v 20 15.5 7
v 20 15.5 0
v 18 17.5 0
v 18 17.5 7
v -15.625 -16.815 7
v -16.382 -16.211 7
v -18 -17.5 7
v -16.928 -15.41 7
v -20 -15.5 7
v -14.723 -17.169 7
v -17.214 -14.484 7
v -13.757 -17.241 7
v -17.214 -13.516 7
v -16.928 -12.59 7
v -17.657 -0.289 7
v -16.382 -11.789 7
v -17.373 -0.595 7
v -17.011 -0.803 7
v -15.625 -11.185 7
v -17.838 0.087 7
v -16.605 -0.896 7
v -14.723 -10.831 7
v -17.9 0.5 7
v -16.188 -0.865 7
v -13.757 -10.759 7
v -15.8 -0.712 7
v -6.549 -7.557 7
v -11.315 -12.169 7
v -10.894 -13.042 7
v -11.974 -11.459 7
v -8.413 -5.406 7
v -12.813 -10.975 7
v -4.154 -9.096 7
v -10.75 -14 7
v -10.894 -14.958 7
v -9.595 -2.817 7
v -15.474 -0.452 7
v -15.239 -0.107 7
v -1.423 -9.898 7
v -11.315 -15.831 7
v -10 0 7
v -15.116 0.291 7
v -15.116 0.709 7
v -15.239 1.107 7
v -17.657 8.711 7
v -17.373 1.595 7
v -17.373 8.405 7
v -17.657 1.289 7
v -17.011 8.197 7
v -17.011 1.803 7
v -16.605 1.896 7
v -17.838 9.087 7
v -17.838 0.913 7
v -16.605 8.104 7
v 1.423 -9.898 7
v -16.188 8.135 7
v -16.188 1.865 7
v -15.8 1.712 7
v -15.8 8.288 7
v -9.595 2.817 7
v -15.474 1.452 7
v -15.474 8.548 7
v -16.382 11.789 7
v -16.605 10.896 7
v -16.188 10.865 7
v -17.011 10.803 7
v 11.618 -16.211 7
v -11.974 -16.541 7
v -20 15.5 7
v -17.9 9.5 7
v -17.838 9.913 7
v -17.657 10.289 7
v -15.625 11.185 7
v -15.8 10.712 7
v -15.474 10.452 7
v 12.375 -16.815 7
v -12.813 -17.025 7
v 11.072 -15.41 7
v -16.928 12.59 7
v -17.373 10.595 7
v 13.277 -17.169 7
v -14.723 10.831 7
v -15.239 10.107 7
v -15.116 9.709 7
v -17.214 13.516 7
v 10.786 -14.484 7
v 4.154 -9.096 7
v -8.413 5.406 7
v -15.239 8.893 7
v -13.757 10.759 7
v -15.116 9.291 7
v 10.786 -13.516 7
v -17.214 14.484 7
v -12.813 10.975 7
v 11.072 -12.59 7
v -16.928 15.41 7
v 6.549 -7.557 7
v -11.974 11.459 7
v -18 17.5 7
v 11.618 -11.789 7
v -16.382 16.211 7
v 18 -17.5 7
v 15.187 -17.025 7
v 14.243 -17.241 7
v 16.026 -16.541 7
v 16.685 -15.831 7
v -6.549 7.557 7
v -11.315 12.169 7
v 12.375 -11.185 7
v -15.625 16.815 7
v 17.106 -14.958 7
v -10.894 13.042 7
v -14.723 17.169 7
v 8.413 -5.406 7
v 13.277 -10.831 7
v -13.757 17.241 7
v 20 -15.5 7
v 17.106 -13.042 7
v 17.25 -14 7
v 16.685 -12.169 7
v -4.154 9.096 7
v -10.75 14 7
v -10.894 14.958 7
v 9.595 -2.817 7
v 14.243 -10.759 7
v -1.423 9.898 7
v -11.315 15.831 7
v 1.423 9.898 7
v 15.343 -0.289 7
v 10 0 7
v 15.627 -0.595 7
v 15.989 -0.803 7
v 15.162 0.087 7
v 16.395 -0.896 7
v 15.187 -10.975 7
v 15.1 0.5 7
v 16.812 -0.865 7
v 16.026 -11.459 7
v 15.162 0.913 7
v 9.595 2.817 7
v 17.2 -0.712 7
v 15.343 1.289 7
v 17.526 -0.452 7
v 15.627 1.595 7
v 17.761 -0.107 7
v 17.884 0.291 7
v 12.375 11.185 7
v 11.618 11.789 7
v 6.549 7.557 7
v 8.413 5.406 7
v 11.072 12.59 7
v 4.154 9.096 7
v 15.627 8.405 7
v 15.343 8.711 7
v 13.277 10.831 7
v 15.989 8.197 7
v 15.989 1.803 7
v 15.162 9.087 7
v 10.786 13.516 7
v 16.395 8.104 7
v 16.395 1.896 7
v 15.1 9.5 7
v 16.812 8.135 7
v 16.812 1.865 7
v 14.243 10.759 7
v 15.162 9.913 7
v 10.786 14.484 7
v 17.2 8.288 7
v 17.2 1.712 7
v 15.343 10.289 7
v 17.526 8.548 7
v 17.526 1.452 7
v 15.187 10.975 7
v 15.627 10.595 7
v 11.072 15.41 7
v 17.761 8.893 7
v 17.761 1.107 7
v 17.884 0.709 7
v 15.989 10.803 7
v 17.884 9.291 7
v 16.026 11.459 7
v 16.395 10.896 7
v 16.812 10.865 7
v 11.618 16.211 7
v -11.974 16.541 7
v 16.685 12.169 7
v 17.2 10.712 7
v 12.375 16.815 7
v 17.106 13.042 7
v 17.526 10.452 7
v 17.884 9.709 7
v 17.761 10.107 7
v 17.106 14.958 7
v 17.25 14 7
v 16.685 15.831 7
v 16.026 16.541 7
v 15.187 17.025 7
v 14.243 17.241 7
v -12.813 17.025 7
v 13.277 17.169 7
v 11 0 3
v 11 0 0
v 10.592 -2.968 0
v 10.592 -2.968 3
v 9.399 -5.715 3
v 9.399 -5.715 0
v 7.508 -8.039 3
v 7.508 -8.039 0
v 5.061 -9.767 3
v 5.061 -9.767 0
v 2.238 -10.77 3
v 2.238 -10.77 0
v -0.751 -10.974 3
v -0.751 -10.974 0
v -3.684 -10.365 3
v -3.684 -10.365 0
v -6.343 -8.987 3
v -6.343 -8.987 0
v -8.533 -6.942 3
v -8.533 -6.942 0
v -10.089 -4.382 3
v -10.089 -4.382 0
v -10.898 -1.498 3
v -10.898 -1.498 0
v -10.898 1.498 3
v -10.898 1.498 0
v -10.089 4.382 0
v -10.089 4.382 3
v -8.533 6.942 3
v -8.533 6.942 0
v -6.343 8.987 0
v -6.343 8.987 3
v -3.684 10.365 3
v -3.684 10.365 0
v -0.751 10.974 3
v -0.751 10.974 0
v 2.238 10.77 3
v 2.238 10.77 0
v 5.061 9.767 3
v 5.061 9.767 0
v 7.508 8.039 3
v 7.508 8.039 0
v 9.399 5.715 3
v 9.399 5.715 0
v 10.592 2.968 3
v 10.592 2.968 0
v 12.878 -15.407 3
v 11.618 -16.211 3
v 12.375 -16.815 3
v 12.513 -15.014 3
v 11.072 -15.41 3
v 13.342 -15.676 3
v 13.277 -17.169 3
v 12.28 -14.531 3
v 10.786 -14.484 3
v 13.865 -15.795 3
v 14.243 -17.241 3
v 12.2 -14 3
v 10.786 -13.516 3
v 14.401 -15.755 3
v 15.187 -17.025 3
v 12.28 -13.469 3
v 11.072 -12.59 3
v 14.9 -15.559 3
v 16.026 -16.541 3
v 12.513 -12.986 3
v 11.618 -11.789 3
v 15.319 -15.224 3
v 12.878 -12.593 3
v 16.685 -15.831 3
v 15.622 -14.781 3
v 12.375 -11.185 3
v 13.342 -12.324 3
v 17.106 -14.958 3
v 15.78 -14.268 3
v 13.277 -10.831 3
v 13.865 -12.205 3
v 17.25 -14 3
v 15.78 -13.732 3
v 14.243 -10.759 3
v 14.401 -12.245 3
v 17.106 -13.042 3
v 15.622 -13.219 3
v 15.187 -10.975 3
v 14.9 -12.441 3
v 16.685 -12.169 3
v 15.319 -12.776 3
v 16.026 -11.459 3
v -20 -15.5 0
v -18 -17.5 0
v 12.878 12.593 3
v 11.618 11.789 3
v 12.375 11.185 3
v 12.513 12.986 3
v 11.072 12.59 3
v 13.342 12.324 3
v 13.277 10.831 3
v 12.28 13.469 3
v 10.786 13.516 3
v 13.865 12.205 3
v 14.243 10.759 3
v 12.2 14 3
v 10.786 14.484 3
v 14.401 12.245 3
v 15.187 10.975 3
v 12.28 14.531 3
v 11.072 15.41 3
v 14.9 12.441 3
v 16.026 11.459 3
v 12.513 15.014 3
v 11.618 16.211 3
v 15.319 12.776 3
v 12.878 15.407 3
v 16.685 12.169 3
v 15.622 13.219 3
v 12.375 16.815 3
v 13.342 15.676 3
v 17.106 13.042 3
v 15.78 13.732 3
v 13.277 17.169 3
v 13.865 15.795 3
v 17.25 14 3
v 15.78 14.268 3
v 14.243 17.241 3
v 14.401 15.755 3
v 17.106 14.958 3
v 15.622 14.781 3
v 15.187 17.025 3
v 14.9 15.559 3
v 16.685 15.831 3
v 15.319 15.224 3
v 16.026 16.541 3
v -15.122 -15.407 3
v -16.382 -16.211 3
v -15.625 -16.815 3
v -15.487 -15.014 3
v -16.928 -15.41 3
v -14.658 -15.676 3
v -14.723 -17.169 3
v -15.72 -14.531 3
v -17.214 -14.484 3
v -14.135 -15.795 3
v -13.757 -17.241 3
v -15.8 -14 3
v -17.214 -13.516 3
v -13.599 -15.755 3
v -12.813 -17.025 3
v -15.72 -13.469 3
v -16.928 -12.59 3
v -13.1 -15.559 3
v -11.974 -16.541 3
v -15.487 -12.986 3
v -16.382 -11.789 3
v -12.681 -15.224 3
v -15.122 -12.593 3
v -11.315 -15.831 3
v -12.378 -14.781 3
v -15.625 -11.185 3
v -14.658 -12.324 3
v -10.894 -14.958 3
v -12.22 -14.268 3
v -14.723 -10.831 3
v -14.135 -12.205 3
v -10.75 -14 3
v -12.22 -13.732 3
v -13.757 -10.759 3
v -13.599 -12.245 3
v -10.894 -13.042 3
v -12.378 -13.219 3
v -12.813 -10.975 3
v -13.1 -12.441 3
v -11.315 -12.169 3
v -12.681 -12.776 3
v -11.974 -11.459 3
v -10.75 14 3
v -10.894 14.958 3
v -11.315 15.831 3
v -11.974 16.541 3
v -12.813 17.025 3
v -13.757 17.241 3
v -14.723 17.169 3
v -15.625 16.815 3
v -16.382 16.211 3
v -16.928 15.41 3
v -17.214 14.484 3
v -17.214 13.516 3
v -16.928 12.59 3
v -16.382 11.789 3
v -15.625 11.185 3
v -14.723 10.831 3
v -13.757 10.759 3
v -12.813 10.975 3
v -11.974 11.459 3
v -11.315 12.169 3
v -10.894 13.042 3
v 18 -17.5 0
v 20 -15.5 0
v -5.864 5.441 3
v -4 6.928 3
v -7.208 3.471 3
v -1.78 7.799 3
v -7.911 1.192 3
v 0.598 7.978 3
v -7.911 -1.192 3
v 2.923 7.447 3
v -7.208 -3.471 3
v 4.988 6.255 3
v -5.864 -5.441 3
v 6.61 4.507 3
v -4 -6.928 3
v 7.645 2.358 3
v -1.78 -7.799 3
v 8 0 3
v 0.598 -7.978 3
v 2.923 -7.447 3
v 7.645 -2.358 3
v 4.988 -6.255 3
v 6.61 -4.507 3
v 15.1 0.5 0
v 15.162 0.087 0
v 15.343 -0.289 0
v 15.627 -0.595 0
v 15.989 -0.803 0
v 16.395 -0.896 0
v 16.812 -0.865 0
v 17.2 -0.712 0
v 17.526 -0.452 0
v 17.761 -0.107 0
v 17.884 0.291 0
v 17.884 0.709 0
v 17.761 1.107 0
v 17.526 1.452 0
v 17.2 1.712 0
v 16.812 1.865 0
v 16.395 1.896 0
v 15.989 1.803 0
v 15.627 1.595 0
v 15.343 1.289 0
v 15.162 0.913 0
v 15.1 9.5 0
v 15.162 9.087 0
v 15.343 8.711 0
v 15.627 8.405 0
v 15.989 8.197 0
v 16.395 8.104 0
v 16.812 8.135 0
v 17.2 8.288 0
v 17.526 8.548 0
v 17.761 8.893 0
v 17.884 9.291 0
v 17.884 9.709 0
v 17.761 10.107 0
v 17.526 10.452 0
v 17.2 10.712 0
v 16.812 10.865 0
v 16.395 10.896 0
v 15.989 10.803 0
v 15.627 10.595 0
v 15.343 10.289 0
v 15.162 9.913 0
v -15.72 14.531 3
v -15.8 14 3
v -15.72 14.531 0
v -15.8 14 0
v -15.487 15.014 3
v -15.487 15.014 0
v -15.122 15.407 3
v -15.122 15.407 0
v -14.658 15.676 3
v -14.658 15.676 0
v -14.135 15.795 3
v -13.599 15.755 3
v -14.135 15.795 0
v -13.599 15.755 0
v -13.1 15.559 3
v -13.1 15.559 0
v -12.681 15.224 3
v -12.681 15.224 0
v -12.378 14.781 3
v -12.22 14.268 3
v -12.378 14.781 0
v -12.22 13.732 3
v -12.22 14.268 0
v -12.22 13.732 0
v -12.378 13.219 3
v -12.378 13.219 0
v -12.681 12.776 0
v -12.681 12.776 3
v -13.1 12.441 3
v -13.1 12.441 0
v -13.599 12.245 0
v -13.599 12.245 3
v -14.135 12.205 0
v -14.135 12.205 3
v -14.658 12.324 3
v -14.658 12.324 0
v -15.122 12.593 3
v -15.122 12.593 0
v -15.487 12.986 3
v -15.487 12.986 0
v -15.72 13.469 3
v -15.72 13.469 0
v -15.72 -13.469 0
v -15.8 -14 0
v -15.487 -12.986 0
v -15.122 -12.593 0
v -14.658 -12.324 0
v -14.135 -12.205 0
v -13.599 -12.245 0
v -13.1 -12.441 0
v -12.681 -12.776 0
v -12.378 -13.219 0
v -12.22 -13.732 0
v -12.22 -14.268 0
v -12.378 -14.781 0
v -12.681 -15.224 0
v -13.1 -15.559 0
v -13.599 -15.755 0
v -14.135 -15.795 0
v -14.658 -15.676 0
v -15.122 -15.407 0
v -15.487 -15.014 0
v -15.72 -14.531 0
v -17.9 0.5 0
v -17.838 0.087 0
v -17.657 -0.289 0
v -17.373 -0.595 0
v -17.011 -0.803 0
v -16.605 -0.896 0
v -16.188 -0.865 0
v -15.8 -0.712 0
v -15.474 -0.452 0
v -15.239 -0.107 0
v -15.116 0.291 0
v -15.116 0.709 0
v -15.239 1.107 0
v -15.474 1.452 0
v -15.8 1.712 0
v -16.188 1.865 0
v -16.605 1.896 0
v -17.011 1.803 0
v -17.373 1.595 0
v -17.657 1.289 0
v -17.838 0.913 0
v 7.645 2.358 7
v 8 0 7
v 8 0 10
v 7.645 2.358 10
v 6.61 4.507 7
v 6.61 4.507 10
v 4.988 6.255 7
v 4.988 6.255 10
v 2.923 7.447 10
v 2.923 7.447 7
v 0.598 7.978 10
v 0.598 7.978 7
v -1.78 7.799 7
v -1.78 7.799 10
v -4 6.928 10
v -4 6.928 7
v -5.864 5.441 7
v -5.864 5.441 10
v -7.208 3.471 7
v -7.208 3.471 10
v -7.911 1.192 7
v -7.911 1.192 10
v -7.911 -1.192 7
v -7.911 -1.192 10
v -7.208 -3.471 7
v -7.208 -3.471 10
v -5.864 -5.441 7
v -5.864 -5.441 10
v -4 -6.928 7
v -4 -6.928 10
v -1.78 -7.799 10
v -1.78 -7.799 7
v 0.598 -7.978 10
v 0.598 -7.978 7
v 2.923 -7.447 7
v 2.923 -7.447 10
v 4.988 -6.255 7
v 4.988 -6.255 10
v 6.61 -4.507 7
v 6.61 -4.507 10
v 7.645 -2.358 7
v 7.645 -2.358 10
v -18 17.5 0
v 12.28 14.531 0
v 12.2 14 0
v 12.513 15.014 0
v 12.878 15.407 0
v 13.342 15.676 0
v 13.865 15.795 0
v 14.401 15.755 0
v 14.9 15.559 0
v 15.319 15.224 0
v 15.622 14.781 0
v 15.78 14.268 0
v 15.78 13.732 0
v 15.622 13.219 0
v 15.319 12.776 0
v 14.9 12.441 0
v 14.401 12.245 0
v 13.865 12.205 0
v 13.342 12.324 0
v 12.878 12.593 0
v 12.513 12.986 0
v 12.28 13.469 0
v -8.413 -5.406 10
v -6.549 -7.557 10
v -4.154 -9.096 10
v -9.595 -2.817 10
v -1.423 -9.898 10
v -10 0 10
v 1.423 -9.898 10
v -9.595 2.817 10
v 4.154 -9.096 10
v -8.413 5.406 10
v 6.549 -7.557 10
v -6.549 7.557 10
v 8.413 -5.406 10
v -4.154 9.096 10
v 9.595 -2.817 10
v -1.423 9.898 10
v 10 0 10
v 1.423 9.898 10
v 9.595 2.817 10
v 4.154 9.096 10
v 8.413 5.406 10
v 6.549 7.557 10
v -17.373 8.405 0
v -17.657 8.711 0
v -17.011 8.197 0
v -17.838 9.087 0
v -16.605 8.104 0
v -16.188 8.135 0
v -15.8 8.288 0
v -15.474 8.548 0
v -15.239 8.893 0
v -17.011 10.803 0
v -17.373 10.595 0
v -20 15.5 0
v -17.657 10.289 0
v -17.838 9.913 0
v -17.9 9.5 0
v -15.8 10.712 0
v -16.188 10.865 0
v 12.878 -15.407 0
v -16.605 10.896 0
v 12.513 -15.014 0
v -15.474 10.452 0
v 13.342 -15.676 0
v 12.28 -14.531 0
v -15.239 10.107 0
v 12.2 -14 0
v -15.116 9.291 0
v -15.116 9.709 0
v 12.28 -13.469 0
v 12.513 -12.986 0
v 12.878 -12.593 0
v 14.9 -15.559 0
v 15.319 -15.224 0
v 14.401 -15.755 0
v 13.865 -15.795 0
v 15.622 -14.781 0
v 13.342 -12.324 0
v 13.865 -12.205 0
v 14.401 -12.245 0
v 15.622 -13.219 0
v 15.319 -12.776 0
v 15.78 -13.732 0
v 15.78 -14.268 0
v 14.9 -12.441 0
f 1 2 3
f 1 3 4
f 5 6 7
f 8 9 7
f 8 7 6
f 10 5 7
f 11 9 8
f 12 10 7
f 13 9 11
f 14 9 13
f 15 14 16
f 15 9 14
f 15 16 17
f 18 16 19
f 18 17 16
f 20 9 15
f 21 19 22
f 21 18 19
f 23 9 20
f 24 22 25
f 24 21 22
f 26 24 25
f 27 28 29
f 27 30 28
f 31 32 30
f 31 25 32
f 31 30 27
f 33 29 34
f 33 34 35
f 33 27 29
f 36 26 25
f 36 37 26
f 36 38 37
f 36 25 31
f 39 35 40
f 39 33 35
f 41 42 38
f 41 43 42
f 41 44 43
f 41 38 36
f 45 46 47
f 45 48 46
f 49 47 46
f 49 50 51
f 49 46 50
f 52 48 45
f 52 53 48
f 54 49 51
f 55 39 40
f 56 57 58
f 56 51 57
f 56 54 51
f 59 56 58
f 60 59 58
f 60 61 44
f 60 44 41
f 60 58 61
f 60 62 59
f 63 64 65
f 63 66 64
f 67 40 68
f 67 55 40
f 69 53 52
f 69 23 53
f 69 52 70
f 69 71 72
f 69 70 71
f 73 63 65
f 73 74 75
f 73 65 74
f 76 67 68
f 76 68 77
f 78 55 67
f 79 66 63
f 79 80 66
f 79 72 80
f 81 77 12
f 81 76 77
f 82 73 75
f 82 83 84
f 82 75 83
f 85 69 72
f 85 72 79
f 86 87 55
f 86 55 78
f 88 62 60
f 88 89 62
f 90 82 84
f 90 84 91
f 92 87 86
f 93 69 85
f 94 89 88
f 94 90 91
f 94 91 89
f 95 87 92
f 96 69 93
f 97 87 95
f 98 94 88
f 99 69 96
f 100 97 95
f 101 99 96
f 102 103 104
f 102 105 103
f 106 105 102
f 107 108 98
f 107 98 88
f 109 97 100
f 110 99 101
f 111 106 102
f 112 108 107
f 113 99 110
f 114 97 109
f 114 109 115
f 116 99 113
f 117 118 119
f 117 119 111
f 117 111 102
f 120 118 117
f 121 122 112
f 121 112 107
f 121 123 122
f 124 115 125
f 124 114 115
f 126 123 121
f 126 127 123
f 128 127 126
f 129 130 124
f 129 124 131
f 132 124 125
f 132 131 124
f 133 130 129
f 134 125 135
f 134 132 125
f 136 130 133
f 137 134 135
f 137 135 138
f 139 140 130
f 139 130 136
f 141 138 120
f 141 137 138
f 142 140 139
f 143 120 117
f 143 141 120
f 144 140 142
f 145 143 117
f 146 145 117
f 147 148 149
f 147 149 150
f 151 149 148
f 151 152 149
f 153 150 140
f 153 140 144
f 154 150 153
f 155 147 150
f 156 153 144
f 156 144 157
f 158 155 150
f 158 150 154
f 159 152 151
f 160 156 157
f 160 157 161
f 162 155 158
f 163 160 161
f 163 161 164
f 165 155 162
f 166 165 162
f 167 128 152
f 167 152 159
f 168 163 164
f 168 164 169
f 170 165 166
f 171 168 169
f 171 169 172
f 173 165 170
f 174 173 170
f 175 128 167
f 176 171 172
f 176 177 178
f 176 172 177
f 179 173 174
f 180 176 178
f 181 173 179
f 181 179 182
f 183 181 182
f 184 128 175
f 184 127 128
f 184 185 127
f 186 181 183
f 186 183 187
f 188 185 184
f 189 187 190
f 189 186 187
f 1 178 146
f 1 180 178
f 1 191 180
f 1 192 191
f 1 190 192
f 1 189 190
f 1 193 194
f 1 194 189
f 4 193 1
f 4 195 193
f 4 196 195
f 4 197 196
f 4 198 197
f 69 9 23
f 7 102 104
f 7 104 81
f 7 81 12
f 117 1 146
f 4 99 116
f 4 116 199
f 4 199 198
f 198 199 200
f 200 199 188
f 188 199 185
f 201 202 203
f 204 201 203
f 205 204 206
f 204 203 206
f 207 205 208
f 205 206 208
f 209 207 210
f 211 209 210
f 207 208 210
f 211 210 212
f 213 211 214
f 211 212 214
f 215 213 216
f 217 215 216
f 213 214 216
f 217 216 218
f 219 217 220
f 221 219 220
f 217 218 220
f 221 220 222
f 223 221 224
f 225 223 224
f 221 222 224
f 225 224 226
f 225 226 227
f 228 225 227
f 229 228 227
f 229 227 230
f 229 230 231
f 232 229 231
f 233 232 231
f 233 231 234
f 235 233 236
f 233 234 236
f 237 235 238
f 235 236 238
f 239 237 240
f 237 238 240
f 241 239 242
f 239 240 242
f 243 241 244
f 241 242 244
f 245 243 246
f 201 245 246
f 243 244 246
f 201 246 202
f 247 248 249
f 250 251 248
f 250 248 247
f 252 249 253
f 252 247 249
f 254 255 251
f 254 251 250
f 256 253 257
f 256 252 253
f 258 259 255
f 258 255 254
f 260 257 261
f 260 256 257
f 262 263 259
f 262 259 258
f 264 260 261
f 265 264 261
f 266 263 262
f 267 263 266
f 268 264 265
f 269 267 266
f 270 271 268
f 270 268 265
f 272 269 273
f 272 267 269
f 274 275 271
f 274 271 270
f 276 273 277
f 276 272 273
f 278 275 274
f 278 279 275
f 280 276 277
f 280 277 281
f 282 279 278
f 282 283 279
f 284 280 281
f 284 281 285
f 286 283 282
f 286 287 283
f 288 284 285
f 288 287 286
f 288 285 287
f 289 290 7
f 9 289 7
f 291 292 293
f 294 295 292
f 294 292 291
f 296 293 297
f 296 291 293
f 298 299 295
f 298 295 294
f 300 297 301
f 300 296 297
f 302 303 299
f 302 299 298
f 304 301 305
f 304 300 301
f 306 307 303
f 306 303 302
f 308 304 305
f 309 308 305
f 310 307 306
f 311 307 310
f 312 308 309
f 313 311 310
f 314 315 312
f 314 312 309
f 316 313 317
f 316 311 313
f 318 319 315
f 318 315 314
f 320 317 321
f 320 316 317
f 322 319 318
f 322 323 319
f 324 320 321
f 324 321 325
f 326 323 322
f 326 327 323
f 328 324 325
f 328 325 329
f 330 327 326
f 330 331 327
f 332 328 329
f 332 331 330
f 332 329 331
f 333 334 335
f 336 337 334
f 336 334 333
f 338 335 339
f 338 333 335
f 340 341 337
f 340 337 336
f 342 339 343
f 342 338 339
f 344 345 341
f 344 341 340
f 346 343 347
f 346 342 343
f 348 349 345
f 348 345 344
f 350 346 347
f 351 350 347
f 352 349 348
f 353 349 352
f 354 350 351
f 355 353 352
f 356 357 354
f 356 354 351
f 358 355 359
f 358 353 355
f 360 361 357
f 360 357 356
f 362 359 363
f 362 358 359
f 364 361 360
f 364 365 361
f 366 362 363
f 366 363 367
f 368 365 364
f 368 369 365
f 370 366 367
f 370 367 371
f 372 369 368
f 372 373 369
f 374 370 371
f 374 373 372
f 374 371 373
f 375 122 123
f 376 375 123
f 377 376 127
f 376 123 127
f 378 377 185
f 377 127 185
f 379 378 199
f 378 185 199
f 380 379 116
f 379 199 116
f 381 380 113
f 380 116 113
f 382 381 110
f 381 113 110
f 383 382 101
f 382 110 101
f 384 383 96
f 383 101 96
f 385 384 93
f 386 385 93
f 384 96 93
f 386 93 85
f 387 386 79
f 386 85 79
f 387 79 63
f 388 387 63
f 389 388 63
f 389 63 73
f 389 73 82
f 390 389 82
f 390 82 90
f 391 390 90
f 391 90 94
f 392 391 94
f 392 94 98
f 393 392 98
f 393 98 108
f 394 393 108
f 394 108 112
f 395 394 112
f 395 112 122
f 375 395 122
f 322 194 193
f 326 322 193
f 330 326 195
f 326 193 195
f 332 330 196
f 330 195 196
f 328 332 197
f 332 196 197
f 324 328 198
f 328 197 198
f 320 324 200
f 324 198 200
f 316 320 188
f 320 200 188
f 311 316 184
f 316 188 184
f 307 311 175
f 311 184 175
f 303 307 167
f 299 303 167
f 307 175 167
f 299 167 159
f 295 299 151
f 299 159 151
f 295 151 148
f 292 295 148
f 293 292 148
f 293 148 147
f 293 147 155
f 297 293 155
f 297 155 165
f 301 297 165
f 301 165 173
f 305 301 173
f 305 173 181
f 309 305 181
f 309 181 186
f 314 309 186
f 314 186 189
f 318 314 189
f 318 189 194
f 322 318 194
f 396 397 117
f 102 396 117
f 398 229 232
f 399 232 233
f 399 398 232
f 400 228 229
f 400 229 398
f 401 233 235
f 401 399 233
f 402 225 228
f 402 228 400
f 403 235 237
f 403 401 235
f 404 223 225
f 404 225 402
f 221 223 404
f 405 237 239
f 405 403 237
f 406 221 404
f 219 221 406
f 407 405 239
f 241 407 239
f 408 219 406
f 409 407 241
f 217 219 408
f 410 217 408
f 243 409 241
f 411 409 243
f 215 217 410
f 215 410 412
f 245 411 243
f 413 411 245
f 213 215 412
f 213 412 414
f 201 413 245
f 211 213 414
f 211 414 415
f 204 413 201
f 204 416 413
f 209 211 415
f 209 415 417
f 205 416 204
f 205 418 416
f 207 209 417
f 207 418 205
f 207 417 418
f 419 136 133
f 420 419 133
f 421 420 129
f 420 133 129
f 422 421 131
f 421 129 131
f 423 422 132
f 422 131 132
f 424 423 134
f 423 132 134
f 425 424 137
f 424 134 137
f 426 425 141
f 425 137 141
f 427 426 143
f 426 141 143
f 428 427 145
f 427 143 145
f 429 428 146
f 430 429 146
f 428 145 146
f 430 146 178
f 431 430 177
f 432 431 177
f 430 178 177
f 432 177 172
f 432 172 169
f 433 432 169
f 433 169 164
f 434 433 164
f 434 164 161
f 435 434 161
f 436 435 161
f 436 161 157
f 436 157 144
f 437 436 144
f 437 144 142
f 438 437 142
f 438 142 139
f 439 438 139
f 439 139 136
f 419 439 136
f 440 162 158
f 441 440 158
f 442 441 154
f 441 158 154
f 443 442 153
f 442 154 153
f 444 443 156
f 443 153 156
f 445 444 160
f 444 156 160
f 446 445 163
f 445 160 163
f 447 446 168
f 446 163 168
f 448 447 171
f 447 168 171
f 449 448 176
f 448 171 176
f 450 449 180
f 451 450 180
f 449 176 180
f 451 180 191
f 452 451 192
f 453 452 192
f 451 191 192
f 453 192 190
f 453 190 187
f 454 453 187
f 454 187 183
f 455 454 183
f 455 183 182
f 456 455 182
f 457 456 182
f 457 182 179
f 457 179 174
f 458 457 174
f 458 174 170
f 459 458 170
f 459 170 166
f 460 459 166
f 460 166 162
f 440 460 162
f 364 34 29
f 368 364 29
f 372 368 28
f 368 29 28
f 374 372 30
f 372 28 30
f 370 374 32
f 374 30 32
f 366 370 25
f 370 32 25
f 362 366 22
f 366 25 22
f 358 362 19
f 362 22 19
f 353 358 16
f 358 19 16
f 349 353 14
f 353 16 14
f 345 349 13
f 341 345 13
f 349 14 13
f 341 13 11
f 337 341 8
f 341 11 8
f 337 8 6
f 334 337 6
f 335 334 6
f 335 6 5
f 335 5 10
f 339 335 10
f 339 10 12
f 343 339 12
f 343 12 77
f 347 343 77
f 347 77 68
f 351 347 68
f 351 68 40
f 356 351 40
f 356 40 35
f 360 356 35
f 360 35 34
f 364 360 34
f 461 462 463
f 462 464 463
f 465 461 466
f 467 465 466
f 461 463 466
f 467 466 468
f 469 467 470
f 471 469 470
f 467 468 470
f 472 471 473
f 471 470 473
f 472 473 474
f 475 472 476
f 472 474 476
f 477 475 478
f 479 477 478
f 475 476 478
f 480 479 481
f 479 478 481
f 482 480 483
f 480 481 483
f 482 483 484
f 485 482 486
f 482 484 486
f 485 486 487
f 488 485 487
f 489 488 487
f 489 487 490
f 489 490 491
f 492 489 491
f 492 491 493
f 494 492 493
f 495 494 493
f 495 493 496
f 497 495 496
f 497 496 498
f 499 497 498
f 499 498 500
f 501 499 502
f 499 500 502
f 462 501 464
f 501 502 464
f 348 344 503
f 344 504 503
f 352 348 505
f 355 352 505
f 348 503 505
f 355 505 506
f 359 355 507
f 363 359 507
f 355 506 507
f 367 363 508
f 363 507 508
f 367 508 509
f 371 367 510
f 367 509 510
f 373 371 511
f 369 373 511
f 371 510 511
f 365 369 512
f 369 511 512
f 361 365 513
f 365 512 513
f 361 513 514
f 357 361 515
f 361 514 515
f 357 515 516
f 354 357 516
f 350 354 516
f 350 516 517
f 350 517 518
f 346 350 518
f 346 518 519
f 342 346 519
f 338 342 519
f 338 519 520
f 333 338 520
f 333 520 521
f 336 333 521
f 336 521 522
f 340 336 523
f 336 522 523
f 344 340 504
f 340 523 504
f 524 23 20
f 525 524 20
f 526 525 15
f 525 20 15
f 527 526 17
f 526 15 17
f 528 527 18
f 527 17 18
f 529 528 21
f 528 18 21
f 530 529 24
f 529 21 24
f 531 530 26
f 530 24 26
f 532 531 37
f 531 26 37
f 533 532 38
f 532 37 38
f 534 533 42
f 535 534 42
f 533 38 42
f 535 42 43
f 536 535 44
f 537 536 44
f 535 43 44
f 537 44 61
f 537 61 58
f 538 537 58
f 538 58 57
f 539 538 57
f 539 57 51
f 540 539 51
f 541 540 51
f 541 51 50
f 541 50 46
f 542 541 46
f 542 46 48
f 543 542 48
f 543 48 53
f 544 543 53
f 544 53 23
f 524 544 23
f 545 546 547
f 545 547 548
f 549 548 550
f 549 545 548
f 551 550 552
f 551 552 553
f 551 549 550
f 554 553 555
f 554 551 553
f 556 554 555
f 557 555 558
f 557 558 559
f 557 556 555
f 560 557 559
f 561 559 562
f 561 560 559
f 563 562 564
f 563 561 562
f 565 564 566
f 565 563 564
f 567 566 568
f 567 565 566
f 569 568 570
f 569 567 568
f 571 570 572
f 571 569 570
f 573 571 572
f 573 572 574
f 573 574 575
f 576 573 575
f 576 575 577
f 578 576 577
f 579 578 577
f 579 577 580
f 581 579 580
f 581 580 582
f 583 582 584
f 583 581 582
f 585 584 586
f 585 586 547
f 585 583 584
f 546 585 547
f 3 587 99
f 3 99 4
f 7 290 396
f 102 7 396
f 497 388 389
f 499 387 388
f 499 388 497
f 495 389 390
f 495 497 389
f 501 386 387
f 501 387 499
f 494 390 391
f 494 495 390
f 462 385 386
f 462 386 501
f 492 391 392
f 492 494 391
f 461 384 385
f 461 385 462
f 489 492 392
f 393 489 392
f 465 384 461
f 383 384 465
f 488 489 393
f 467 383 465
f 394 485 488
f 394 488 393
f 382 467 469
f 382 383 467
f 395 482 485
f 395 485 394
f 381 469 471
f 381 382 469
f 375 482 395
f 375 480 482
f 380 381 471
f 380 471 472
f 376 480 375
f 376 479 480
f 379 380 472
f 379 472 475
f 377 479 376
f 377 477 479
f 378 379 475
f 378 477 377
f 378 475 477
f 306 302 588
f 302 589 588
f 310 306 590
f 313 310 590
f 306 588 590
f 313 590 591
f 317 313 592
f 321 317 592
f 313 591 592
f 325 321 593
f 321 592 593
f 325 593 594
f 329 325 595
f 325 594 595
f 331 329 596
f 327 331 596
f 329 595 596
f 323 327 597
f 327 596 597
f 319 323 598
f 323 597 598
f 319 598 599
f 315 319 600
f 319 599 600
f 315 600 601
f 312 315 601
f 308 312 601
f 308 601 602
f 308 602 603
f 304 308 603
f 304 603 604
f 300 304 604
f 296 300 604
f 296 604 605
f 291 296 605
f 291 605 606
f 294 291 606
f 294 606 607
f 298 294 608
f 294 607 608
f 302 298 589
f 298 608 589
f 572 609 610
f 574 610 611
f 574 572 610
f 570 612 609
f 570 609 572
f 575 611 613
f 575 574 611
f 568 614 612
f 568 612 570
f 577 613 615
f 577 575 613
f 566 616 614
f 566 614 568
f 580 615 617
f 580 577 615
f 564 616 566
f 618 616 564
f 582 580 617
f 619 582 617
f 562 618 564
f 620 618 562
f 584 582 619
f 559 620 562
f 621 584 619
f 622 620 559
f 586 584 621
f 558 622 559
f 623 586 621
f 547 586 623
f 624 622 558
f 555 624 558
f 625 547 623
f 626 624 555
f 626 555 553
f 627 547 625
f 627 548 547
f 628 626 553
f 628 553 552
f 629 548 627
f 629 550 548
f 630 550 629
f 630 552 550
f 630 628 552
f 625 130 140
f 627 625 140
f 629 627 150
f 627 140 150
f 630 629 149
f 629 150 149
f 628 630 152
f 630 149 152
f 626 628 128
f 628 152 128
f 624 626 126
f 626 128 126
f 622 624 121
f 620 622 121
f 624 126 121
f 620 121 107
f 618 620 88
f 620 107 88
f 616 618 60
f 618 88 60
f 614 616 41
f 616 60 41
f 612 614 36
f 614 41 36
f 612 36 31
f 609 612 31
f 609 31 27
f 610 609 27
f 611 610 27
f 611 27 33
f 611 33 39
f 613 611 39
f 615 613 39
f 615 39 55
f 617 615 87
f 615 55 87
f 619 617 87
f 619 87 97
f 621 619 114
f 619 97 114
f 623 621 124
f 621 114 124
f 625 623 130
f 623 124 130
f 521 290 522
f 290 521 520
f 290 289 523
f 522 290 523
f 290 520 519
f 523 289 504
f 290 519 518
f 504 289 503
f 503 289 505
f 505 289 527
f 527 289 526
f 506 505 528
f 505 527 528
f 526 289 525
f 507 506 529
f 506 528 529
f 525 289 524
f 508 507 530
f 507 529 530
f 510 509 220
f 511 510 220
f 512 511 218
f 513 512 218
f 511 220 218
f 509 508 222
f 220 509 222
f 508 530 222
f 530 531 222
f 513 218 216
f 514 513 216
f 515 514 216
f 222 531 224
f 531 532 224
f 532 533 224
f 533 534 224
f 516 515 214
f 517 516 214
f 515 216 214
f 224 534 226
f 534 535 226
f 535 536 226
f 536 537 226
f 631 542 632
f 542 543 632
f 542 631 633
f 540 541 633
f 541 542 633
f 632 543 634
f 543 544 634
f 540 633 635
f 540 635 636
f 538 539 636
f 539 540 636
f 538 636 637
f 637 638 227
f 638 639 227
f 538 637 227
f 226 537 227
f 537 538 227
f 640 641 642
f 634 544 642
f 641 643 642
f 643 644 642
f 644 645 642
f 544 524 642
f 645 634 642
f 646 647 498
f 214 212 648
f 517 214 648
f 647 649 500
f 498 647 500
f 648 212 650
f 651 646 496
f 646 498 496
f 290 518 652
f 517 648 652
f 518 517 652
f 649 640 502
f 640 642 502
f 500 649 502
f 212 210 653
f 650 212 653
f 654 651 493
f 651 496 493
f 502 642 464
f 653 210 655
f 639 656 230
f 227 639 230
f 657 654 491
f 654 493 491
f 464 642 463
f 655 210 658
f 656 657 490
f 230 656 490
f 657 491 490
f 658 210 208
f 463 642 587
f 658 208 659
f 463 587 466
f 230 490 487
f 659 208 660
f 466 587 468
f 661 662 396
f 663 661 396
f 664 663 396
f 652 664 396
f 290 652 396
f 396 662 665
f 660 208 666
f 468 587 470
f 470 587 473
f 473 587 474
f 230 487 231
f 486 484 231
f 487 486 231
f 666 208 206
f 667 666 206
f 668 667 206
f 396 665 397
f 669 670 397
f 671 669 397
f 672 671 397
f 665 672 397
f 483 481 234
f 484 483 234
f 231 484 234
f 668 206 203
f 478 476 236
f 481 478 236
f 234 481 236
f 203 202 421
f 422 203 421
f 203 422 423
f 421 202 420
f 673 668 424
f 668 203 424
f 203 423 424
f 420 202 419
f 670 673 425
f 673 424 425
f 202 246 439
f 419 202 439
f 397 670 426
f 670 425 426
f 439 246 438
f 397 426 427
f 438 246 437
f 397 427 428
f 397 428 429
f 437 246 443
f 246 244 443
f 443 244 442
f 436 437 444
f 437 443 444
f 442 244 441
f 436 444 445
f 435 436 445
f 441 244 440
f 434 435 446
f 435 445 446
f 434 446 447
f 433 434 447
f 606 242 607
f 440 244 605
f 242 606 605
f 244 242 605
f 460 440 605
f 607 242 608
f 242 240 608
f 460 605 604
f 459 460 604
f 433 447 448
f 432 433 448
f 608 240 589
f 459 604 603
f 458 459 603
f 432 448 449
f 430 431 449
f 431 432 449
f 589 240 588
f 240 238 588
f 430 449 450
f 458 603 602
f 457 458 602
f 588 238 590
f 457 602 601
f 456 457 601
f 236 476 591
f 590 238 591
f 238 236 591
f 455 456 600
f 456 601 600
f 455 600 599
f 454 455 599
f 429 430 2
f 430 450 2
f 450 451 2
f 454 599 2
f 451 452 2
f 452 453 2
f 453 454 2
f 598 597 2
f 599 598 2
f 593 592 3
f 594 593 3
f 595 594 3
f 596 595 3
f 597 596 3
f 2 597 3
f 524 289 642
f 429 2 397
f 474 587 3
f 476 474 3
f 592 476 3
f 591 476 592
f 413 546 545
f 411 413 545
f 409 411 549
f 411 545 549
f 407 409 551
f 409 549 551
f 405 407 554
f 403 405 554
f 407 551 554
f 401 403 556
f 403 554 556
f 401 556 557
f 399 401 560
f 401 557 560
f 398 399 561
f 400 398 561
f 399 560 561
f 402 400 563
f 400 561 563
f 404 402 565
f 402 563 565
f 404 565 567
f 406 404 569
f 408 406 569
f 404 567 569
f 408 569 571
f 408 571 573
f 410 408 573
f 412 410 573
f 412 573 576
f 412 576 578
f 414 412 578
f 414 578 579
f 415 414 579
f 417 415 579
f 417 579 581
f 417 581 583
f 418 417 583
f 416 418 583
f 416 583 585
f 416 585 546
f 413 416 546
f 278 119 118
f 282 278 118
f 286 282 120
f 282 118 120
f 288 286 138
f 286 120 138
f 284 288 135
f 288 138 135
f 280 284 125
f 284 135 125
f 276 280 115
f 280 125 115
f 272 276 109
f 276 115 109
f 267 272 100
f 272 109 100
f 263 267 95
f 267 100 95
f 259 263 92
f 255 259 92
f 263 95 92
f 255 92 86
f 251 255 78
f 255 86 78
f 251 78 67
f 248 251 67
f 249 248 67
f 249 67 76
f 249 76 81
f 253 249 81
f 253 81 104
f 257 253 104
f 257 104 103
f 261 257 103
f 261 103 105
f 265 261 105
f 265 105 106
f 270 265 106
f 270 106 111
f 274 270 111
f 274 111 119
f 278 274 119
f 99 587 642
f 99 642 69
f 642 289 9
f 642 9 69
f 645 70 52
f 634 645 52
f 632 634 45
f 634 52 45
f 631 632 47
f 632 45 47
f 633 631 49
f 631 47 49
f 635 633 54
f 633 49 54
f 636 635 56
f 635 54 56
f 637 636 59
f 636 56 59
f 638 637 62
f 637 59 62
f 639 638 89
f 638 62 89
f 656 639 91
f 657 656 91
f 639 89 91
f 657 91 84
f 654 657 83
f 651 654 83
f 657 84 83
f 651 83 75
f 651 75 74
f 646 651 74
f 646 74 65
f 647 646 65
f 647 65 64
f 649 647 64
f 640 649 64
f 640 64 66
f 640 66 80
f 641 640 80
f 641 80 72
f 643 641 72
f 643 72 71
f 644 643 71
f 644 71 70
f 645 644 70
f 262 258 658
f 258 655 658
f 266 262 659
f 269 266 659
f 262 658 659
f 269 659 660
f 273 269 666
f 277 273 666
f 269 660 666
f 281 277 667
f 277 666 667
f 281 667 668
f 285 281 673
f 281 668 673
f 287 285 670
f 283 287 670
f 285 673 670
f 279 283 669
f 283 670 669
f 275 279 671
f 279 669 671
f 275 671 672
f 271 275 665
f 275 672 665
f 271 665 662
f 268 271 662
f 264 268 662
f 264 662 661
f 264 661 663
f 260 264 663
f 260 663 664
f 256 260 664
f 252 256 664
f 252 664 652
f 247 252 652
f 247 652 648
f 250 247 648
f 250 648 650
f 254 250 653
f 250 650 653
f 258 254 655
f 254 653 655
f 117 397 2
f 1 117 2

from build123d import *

# Parameters (mm, degrees)
F1_W           = 40
F1_H           = 35
F2_DEPTH       = 7
F3_R           = 10
F3_R_2         = 8
F4_DEPTH       = 3
F5_DEPTH       = 7
F6_R           = 11
F7_DEPTH       = 3
F9_D           = 3.6
F9_CBORE_D     = 6.5
F9_CBORE_DEPTH = 4
F10_D          = 2.8
F11_SIZE       = 2


with BuildPart() as f2:
    # F1 (on Top) → F2 (new body)
    with BuildSketch(Plane.XY):
        Rectangle(F1_W, F1_H)
    extrude(amount=F2_DEPTH)

    # F3 (on face) → F4 (join)
    with BuildSketch(Plane.XY.offset(7)):
        Circle(F3_R)
        Circle(F3_R_2, mode=Mode.SUBTRACT)
    extrude(amount=F4_DEPTH)

    # F5 (cut, through all): a face of the model
    f5_faces = [f2.faces().sort_by_distance(p)[0] for p in [
        (0, 0, 7),
    ]]
    extrude(f5_faces, amount=-F5_DEPTH, mode=Mode.SUBTRACT)

    # F6 (on face) → F7 (cut)
    with BuildSketch(Plane(origin=(0, 0, 0), x_dir=(1, 0, 0), z_dir=(0, 0, -1))):
        Circle(F6_R)
    extrude(amount=-F7_DEPTH, mode=Mode.SUBTRACT)

    # F9 (through all)
    with Locations(Plane.XY.offset(7)):
        with Locations((-14, 14), (14, 14), (14, -14), (-14, -14)):
            CounterBoreHole(F9_D / 2, F9_CBORE_D / 2, F9_CBORE_DEPTH)

    # F10 (through all)
    with Locations(Plane(origin=(0, 0, 0), x_dir=(1, 0, 0), z_dir=(0, 0, -1))):
        with Locations((-16.5, -9.5), (-16.5, -0.5), (16.5, -9.5), (16.5, -0.5)):
            Hole(F10_D / 2)

    # F11
    f11_edges = [f2.edges().sort_by_distance(p)[0] for p in [
        (-20, 17.5, 3.5),
        (-20, -17.5, 3.5),
        (20, 17.5, 3.5),
        (20, -17.5, 3.5),
    ]]
    chamfer(f11_edges, length=F11_SIZE)


solid = f2.part
